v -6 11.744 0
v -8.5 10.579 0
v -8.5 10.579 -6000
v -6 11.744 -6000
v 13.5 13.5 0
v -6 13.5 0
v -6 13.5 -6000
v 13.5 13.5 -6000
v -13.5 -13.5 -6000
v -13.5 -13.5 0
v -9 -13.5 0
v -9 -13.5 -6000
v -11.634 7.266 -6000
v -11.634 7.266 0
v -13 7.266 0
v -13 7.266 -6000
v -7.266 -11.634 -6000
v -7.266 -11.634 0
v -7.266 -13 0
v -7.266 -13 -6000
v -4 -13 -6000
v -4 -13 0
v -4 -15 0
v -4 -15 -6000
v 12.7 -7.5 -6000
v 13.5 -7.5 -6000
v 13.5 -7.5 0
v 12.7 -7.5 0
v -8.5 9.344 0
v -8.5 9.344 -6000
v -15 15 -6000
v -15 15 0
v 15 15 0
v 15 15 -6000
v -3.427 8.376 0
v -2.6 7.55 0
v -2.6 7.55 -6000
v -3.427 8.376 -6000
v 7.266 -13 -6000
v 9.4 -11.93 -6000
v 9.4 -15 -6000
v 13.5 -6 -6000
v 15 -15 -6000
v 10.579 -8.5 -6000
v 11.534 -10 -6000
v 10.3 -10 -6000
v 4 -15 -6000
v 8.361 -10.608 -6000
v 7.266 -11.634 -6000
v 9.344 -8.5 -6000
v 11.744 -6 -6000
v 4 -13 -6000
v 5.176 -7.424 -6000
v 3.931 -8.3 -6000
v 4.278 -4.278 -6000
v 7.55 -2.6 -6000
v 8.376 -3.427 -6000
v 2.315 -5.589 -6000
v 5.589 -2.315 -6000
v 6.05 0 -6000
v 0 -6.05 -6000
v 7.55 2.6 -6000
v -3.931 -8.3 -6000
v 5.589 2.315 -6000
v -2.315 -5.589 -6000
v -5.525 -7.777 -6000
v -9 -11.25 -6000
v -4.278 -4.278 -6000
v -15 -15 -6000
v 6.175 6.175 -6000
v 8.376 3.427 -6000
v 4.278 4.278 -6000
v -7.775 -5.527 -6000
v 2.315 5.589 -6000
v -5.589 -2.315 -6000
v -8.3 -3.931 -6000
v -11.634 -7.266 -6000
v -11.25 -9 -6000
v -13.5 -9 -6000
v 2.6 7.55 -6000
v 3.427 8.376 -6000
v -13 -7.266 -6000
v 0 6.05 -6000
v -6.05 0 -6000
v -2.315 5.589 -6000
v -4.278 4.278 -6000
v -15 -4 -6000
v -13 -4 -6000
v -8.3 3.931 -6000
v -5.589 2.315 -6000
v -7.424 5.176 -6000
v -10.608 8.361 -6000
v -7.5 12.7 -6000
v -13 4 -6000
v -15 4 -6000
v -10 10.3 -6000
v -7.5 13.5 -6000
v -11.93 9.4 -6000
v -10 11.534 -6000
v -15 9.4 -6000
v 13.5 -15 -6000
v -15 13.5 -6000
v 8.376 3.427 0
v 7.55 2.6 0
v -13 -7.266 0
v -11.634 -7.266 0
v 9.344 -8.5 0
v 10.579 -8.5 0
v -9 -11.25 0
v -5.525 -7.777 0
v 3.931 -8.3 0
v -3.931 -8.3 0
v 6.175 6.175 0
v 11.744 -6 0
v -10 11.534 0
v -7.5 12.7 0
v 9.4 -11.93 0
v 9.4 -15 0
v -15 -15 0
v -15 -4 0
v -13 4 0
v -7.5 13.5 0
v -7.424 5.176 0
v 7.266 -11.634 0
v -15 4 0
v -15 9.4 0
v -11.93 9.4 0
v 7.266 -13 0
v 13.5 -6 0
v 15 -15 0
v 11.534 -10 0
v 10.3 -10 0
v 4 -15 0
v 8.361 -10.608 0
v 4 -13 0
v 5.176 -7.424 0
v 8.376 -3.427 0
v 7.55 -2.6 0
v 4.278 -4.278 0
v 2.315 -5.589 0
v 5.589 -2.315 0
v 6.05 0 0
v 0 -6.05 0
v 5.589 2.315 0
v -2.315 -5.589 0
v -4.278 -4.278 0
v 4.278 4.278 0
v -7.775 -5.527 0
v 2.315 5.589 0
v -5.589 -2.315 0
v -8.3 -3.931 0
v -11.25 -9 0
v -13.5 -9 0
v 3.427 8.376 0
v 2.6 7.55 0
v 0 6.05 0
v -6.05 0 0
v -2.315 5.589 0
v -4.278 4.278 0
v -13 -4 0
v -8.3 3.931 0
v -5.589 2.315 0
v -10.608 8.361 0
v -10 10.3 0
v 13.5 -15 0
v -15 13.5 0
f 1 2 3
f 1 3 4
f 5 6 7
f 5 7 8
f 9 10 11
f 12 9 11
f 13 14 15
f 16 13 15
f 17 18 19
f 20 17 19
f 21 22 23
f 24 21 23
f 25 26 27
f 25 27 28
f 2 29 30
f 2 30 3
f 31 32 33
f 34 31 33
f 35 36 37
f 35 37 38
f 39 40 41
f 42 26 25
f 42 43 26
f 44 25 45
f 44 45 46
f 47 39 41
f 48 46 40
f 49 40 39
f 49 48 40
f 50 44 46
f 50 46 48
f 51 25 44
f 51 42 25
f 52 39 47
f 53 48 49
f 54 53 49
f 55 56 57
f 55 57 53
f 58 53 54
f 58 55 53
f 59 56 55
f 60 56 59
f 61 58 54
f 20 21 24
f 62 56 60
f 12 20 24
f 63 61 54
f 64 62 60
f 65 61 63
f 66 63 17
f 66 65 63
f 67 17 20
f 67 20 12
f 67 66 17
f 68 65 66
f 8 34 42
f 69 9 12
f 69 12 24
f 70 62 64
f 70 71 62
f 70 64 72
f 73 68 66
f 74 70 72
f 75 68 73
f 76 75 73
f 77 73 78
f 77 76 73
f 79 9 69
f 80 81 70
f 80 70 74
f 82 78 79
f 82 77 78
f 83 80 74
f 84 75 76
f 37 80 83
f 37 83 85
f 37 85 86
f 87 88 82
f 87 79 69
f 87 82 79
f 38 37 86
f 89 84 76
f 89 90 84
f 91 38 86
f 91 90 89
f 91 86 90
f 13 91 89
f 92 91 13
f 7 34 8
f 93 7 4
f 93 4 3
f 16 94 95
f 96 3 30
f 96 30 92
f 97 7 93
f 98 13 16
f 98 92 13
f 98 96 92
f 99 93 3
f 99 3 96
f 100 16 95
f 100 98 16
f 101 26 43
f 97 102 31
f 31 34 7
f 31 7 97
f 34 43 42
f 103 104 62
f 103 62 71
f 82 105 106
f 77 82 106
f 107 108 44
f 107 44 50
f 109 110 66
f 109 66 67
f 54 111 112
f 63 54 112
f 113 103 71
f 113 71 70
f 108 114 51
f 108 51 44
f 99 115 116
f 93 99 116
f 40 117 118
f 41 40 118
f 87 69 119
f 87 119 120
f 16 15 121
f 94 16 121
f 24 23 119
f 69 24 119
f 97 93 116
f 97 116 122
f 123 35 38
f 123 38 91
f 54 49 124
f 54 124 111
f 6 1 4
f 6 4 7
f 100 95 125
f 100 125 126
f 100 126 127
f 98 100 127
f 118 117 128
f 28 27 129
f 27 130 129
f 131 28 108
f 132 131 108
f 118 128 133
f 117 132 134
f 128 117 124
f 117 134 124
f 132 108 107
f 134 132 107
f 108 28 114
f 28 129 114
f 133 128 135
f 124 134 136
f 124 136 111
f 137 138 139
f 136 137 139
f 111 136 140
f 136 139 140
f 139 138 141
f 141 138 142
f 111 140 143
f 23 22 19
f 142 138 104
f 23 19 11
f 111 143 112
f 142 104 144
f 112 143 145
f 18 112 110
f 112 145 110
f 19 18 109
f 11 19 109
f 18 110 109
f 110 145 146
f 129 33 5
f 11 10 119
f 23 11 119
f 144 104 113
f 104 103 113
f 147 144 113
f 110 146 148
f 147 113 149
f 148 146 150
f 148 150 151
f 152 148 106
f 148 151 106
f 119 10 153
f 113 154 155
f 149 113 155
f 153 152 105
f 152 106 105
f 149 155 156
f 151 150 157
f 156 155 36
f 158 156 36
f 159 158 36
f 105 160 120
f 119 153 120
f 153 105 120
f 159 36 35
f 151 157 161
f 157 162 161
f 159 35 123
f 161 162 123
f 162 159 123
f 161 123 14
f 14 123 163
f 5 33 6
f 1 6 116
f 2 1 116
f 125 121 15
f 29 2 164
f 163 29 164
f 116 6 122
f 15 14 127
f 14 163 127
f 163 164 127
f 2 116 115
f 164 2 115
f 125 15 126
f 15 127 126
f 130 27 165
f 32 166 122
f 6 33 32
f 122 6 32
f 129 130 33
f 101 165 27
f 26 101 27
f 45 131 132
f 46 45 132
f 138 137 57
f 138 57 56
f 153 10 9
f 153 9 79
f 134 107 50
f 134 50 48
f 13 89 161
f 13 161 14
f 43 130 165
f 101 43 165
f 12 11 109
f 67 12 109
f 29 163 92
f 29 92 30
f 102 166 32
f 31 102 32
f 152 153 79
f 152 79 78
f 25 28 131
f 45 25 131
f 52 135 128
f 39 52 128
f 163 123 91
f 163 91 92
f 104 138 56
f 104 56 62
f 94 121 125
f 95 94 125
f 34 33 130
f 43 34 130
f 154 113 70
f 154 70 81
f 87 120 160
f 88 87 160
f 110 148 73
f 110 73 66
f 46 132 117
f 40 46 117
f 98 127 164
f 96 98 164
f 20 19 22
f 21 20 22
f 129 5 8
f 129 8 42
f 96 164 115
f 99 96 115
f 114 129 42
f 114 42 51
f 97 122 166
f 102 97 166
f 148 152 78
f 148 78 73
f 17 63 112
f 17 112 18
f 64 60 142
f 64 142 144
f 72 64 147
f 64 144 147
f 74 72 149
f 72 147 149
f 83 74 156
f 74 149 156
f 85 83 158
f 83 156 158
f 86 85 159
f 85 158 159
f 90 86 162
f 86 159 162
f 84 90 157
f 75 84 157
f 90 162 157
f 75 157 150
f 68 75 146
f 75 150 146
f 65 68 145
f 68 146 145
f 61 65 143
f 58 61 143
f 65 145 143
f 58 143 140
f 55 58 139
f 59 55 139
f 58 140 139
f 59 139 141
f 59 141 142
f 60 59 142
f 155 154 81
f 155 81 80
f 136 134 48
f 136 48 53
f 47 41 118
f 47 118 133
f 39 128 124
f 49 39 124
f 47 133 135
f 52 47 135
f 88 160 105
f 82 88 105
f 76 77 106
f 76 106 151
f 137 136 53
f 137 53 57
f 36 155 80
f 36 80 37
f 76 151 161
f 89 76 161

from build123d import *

# Parameters (mm, degrees)
SKETCH1_R          = 6.05
SKETCH1_W          = 4.5
SKETCH1_H          = 4.5
EXTRUDE1_DEPTH     = 6000
CUT_EXTRUDE1_DEPTH = 6001


with BuildPart() as part:
    # Sketch1 → Extrude1 (new body)
    with BuildSketch(Plane.XY):
        Polygon((15, -14.99999999), (13.499999971, -14.99999999), (13.499999971, -7.49999999), (12.70000011, -7.49999999), (11.534230832, -9.99999999), (10.300000176, -9.99999999), (9.399999971, -11.93005553), (9.399999971, -15), (4, -15), (4, -13), (7.265685, -13), (7.265685, -11.63431525), (3.931371213, -8.3), (-3.931371213, -8.3), (-7.265685, -11.63431525), (-7.265685, -13), (-4, -13), (-4, -15), (-15, -15), (-15, -4), (-13, -4), (-13, -7.265685), (-11.63431525, -7.265685), (-8.3, -3.931371213), (-8.3, 3.931371213), (-11.63431525, 7.265685), (-13, 7.265685), (-13, 4), (-15, 4), (-15, 9.399999971), (-11.93005553, 9.399999971), (-9.99999999, 10.300000176), (-9.99999999, 11.534230832), (-7.49999999, 12.70000011), (-7.49999999, 13.499999971), (-14.999999992, 13.499999971), (-14.999999992, 15), (15, 15), align=None)
        Circle(SKETCH1_R, mode=Mode.SUBTRACT)
        Polygon((10.57862485, -8.5), (9.344395021, -8.5), (8.361187544, -10.60849553), (5.176238259, -7.423547516), (8.376249722, -3.426503268), (7.55, -2.600251667), (7.55, 2.600251667), (8.376249722, 3.426503268), (6.175454615, 6.175454615), (3.426503268, 8.376249722), (2.600251667, 7.55), (-2.600251667, 7.55), (-3.426503268, 8.376249722), (-7.423547516, 5.176238259), (-10.60849553, 8.361187544), (-8.5, 9.344395021), (-8.5, 10.57862485), (-6, 11.7443949), (-6, 13.5), (13.5, 13.5), (13.5, -6), (11.7443949, -6), align=None, mode=Mode.SUBTRACT)
        with Locations((-11.25, -11.25)):
            Rectangle(SKETCH1_W, SKETCH1_H, mode=Mode.SUBTRACT)
    extrude(amount=-EXTRUDE1_DEPTH)

    # Sketch2 → Cut-Extrude1 (cut, through all)
    with BuildSketch(Plane.XY):
        Polygon((-11.25, -9), (-7.77480438, -5.52686047), (-5.52480438, -7.77686047), (-9, -11.25), align=None)
    extrude(amount=-CUT_EXTRUDE1_DEPTH, mode=Mode.SUBTRACT)


solid = part.part
